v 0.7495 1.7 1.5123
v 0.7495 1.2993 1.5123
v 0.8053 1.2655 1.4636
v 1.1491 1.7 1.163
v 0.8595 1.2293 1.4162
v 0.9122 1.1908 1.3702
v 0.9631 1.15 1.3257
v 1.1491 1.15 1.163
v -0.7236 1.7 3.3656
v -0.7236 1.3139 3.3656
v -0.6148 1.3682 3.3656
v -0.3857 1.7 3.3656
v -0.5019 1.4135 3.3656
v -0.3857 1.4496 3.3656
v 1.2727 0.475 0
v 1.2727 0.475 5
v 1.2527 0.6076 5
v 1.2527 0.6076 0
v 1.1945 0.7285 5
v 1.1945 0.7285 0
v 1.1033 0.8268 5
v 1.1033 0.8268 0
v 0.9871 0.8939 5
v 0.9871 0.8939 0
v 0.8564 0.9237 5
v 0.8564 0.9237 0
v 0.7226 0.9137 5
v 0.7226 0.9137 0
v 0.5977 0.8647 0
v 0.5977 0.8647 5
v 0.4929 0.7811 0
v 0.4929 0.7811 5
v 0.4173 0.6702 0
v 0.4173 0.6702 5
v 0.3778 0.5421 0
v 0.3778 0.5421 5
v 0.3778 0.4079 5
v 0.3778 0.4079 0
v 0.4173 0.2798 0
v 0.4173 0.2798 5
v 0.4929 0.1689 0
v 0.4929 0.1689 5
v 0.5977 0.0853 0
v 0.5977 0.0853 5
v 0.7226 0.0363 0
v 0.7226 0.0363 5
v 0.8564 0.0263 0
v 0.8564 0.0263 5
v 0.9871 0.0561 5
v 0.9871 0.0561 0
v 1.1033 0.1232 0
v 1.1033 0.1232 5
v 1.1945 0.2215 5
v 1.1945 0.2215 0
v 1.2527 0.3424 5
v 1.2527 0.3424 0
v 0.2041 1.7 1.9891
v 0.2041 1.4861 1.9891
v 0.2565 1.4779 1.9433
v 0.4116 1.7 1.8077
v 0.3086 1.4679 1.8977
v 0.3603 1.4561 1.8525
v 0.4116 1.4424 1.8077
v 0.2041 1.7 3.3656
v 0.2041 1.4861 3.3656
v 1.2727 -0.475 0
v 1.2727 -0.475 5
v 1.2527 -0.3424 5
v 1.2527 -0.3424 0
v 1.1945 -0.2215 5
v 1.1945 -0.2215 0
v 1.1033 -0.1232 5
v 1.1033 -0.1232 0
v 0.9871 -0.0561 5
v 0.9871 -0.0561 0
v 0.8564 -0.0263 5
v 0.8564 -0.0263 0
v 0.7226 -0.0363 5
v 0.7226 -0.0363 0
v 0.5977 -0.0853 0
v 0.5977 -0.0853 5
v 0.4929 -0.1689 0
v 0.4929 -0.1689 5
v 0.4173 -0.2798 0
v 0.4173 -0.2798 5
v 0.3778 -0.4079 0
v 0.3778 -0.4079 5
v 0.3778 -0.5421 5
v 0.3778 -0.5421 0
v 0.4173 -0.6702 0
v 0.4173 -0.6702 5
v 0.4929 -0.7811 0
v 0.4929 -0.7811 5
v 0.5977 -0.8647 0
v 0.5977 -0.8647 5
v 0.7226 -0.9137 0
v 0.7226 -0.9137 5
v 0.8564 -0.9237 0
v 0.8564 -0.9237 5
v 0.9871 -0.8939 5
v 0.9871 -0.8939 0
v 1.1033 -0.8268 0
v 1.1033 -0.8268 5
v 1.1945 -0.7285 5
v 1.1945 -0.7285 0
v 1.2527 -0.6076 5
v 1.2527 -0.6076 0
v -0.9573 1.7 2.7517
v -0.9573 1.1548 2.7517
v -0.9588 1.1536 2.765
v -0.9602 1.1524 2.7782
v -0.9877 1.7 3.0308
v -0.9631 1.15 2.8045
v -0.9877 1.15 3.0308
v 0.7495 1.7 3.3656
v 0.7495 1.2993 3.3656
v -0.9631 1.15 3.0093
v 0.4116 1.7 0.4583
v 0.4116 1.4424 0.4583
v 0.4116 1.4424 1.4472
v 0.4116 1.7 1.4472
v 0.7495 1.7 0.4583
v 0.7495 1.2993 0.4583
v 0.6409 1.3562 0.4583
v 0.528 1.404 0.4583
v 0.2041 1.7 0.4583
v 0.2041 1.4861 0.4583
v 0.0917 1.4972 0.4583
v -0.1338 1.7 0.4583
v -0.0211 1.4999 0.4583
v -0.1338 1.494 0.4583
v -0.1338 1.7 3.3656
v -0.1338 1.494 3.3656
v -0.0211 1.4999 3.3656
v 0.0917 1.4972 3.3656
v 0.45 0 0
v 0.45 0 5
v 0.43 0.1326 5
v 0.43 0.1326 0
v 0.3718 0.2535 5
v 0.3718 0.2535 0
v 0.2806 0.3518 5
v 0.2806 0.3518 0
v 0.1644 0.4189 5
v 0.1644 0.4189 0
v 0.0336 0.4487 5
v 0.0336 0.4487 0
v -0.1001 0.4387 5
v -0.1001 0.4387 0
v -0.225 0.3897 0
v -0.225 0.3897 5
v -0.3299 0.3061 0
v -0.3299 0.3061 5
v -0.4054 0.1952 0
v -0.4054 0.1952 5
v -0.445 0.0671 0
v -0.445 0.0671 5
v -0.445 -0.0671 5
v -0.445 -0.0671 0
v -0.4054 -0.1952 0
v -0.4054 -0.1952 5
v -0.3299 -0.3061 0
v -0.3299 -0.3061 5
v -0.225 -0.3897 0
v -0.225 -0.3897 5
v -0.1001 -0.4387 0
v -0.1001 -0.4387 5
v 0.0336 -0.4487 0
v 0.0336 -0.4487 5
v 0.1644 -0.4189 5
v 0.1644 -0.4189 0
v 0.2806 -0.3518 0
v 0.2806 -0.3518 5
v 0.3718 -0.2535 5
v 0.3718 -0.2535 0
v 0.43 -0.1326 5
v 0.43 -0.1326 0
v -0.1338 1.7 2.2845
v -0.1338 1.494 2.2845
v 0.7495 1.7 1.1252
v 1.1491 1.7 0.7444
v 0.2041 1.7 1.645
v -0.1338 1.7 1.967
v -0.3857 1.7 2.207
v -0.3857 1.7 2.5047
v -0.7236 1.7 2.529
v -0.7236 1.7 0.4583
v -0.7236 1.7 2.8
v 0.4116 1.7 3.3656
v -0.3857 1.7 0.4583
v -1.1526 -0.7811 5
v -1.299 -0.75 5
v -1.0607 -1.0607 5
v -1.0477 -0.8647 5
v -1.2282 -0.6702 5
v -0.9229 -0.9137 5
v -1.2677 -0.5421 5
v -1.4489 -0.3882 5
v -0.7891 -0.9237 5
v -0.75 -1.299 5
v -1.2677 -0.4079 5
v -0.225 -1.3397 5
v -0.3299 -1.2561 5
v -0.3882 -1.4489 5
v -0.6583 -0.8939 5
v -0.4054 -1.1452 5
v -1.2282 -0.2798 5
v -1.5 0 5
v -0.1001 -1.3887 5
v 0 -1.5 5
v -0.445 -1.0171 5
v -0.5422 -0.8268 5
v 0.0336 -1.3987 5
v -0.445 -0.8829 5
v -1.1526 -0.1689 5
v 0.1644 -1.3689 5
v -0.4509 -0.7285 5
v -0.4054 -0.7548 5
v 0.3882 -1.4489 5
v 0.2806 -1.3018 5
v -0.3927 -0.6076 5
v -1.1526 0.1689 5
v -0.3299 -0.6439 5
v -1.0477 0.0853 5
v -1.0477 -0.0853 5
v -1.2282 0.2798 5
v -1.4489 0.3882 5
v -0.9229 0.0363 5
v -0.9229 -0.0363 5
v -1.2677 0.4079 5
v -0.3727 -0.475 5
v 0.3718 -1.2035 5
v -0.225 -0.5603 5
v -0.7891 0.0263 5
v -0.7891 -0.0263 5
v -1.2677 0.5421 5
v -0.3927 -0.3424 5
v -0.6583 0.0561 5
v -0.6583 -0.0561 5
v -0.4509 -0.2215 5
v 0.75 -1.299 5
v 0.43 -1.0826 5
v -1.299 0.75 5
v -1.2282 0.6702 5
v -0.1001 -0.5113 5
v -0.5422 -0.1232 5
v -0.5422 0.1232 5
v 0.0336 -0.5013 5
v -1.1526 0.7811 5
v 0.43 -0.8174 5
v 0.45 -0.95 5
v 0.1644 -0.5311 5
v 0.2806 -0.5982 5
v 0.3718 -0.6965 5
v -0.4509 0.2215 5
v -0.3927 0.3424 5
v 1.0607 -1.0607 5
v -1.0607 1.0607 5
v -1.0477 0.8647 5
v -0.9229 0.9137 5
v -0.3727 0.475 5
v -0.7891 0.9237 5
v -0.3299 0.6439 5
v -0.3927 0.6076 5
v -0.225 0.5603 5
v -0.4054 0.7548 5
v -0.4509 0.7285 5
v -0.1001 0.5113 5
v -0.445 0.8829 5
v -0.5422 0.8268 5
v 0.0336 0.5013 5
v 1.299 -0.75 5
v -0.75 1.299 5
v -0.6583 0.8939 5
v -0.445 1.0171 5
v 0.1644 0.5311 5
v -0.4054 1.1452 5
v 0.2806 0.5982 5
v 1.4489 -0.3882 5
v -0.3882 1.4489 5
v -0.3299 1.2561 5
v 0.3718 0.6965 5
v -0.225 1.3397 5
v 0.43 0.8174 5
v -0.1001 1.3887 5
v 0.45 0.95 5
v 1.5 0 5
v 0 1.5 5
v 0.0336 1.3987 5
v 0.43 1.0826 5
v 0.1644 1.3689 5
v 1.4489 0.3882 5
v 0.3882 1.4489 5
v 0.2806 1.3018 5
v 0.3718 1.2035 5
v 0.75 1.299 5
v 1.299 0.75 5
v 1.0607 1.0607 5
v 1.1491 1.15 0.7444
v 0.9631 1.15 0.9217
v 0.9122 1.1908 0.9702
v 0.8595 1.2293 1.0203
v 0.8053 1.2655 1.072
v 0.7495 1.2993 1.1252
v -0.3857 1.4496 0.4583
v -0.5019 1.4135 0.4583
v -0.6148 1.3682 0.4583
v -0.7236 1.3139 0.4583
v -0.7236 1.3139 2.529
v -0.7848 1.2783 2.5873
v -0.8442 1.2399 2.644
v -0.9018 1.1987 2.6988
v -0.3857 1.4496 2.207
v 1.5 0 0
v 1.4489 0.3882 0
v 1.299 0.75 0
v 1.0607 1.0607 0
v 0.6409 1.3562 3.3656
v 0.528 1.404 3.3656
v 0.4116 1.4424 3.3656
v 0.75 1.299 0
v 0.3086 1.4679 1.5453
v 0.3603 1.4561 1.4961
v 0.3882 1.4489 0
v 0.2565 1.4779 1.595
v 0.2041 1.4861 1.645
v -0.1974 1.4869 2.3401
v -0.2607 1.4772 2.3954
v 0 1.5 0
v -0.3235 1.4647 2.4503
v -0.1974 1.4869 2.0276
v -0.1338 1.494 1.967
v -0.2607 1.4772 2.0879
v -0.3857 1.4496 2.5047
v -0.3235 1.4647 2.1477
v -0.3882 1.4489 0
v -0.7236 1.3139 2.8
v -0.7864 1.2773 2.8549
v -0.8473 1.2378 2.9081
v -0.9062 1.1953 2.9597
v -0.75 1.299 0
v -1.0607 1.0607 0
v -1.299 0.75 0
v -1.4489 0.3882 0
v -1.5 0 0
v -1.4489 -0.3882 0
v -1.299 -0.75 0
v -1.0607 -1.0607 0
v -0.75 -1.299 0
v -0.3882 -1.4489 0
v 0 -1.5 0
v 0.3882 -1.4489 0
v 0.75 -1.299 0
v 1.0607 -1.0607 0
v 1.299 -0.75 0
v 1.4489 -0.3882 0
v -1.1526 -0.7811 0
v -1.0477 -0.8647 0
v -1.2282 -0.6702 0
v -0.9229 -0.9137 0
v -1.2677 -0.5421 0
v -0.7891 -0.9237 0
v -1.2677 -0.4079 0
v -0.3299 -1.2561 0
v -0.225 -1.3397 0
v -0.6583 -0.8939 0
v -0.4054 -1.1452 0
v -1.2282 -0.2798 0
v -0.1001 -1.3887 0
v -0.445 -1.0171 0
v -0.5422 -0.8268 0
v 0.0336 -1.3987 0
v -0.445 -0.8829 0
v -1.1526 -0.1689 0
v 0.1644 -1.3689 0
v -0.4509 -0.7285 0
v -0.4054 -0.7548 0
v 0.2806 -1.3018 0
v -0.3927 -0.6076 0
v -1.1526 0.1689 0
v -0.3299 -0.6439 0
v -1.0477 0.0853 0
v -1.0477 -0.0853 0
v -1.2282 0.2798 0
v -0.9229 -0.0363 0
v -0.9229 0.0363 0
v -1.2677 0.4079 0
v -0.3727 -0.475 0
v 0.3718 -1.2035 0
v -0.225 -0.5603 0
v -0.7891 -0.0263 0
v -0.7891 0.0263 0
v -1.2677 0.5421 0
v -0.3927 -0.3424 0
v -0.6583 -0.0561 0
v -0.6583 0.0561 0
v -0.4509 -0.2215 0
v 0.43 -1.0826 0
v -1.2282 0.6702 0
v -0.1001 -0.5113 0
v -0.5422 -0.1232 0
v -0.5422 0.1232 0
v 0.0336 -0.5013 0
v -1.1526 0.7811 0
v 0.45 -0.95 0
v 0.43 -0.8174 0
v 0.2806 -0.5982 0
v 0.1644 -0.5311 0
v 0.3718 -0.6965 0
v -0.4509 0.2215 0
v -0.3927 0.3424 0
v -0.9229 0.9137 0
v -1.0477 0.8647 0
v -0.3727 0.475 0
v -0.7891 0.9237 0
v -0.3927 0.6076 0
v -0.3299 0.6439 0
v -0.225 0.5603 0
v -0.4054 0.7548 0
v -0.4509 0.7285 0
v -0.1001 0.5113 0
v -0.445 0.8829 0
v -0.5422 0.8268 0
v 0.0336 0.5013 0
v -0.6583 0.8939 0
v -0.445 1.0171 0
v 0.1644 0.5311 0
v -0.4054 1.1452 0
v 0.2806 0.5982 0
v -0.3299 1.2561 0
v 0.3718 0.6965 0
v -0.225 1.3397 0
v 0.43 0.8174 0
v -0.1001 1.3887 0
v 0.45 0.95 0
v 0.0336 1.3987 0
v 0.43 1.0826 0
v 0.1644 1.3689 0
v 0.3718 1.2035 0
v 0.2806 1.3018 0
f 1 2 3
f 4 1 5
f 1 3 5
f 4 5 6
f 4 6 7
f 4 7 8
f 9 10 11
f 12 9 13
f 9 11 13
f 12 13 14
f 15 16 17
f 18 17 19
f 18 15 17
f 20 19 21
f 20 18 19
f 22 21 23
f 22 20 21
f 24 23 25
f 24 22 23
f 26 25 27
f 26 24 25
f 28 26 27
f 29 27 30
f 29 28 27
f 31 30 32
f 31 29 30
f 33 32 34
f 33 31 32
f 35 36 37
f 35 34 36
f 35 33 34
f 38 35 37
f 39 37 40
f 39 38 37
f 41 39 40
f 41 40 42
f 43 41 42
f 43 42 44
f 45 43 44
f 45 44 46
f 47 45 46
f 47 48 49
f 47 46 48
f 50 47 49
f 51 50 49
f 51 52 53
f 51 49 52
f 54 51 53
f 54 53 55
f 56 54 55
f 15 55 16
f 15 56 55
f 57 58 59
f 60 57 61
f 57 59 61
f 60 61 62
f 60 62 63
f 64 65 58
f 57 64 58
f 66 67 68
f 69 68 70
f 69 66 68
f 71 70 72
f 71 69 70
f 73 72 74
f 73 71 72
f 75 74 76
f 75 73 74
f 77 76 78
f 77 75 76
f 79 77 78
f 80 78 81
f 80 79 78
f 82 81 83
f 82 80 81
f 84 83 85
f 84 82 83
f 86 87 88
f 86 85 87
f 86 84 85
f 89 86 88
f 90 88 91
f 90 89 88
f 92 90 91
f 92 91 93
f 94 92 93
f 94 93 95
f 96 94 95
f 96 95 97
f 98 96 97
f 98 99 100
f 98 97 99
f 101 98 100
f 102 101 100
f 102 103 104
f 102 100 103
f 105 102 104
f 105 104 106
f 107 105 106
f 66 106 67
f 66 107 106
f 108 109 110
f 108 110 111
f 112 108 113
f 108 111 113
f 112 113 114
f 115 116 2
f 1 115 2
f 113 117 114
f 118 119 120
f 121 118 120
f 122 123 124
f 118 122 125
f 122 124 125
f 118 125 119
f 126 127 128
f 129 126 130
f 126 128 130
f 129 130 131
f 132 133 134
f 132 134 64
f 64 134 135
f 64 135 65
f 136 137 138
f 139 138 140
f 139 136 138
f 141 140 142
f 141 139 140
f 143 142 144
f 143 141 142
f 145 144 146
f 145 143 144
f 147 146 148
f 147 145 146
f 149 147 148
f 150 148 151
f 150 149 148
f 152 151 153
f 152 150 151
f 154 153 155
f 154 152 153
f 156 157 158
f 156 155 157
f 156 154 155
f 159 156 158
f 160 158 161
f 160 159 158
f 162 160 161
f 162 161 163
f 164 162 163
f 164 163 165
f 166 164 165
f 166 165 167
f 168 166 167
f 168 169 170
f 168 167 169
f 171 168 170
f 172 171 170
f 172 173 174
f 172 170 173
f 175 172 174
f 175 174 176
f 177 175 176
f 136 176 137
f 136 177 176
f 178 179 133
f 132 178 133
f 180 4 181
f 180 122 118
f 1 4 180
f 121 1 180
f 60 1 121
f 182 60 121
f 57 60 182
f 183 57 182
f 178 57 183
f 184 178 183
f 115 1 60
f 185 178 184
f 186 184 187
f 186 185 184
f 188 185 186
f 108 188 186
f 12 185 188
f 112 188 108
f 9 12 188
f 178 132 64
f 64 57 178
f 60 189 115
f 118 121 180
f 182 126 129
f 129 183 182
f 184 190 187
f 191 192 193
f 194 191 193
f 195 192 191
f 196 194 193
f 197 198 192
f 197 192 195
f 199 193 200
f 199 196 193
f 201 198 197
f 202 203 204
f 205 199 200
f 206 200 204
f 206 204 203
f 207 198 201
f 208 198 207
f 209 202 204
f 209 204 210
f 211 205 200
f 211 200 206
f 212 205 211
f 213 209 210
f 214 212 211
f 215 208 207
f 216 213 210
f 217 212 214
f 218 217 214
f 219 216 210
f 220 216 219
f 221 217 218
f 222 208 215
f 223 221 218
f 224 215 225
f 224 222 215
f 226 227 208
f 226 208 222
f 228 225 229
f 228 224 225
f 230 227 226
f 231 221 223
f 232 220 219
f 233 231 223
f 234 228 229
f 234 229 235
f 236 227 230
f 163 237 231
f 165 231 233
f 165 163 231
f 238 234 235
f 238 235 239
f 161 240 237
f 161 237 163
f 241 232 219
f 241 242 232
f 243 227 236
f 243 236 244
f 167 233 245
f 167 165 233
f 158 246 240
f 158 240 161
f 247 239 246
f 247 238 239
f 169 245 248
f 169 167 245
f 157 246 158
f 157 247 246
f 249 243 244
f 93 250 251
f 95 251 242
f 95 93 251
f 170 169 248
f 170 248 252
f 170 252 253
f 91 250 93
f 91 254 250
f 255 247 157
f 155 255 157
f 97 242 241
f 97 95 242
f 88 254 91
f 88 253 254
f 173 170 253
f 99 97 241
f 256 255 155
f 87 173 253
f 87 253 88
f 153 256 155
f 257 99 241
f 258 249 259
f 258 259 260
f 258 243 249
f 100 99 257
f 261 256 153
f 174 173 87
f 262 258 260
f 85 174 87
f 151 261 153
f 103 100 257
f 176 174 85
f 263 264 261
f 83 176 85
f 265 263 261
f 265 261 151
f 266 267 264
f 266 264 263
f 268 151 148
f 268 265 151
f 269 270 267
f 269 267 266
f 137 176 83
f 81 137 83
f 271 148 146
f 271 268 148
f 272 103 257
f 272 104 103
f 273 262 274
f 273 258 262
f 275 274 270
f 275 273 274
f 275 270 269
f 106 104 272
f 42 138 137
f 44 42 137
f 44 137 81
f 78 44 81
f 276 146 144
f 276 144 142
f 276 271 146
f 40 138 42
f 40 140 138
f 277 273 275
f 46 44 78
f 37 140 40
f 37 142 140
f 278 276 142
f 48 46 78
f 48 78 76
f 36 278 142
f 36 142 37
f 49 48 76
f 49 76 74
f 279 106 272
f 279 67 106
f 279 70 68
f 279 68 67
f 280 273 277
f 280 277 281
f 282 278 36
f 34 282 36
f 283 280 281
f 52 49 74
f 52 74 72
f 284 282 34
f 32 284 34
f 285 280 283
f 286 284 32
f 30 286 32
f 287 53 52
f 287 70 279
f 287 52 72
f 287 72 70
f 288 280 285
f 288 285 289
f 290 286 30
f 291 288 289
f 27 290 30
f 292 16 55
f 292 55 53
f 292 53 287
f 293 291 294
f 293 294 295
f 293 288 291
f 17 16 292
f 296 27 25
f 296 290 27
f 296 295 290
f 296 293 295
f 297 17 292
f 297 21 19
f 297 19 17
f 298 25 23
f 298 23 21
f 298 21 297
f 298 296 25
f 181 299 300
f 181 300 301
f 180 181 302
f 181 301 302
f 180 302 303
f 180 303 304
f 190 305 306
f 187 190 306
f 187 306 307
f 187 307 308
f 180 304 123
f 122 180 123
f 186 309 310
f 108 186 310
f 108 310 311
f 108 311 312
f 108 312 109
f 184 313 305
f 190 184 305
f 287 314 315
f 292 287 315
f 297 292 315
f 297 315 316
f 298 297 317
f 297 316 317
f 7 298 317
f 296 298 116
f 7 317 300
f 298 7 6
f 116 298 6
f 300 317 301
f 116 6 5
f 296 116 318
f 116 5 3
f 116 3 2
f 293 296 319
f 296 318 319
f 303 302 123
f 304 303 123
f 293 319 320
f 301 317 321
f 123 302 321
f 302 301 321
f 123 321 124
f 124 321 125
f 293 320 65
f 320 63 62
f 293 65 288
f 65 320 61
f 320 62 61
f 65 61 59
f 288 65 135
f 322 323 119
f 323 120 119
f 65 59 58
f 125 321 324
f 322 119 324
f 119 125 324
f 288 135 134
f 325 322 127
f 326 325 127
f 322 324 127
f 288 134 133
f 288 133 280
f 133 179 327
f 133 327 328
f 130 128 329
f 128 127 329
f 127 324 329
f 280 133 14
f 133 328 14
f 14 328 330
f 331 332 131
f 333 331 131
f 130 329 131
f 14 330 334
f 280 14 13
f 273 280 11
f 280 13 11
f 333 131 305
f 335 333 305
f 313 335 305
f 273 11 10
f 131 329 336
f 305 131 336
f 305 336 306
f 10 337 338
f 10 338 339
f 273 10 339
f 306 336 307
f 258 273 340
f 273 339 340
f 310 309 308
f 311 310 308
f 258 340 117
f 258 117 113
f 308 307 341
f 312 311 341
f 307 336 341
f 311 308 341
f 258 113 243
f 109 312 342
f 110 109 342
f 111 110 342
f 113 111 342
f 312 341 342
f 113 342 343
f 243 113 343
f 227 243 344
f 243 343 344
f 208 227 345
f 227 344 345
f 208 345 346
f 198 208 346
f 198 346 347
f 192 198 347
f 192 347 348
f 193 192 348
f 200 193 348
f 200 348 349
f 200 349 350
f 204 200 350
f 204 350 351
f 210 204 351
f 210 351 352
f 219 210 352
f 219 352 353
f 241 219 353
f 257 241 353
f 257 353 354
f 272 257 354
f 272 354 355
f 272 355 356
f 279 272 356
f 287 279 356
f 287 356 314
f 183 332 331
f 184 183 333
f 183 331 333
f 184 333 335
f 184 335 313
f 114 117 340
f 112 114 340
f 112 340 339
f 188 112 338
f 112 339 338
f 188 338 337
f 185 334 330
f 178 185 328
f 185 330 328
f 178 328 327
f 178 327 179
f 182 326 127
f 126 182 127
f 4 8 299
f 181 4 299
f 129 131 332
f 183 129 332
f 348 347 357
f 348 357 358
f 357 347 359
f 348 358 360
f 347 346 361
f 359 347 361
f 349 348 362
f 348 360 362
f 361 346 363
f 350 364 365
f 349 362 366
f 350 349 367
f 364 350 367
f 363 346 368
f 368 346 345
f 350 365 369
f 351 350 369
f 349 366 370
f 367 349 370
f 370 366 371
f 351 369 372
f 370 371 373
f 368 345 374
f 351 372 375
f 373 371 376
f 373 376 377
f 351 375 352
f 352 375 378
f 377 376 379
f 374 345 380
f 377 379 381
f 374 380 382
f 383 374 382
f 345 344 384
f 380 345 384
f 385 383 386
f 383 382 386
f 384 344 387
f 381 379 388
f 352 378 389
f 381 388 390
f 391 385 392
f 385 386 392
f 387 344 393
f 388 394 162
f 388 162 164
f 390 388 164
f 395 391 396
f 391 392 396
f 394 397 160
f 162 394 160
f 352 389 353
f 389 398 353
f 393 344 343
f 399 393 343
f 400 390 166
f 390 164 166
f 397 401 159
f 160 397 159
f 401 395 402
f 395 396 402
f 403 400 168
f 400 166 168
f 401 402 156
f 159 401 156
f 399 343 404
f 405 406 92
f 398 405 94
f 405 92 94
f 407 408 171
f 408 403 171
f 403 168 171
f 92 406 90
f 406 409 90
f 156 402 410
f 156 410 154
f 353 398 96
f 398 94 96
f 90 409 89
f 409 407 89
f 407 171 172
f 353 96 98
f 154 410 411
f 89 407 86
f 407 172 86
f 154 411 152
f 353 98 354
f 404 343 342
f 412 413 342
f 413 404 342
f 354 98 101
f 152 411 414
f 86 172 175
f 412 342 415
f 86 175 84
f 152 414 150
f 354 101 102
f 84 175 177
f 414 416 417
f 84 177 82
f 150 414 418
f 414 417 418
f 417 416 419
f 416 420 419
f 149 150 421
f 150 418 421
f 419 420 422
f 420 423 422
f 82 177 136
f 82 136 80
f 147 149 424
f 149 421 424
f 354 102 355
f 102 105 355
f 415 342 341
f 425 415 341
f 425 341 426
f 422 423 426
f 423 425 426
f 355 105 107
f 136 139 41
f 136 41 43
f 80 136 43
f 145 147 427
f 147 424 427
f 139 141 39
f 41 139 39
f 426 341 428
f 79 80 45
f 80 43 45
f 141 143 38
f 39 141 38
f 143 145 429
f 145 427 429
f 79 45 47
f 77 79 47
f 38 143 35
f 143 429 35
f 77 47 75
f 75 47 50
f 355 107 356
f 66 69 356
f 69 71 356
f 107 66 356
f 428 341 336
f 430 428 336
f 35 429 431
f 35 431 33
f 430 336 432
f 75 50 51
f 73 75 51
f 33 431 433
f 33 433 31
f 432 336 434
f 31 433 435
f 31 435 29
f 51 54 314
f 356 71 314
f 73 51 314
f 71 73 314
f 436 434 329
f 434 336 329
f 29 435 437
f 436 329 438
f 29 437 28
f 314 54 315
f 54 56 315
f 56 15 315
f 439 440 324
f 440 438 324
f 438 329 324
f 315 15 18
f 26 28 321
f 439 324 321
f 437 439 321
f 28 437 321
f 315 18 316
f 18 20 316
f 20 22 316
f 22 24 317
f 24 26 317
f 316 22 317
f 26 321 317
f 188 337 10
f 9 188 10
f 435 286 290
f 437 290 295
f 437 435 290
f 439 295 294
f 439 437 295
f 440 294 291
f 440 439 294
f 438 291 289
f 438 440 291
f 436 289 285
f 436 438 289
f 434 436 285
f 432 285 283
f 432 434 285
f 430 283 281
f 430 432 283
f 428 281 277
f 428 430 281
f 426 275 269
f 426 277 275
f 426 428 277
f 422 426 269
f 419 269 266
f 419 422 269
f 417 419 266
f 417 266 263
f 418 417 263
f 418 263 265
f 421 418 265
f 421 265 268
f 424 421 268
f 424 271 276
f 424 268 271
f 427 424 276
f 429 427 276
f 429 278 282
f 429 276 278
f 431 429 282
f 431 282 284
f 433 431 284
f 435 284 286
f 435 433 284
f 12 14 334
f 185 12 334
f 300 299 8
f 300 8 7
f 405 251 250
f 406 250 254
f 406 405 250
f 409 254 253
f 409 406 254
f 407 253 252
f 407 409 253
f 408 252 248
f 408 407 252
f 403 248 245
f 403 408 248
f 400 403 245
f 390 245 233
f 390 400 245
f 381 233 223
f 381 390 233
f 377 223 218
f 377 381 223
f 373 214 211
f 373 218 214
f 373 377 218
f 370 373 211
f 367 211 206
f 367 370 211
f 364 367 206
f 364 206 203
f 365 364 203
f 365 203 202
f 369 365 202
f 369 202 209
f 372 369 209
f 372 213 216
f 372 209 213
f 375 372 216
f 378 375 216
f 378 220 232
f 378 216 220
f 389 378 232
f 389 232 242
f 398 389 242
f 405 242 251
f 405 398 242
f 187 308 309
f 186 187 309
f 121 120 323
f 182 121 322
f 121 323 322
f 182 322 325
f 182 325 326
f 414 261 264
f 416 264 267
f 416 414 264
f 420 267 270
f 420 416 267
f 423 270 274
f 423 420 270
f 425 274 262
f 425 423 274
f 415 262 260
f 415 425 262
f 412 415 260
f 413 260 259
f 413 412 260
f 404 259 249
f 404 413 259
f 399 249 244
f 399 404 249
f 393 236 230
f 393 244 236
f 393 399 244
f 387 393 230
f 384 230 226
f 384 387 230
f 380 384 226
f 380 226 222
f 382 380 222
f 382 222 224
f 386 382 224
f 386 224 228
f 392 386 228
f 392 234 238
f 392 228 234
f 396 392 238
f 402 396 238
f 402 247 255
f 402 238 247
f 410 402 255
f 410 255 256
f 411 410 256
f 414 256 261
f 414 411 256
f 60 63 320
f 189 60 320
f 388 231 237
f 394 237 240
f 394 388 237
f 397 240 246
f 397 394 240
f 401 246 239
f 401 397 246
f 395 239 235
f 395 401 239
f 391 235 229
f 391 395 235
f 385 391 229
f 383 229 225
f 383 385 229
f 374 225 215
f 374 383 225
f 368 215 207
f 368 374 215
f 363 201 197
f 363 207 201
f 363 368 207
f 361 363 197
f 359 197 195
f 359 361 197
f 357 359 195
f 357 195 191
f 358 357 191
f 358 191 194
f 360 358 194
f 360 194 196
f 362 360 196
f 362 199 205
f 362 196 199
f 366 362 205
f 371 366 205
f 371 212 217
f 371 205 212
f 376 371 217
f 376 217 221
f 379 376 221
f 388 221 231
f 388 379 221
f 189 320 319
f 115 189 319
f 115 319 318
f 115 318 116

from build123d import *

# Parameters (mm, degrees)
F2_R      = 1.5
F3_DEPTH  = 5
F9_DEPTH  = 0.55
F1_R      = 0.45
F10_DEPTH = 5.001


with BuildPart() as f3:
    # F2 (on Top) → F3 (new body)
    with BuildSketch(Plane.XY):
        Circle(F2_R)
    extrude(amount=F3_DEPTH)

    # F8 (on face) → F9 (join)
    with BuildSketch(Plane(origin=(0, 1.15, 0), x_dir=(-1, 0, 0), z_dir=(0, 1, 0))):
        Polygon((0.9573300485, 2.7517464478), (0.9876711119, 3.0308461282), (0.7235942503, 2.8000105567), (0.7235942503, 2.5290050786), align=None)
        Polygon((0.7235942503, 2.5290050786), (0.7235942503, 2.8000105567), (0.3857031334, 2.5046522711), (0.3857031334, 2.2070076328), align=None)
        Polygon((0.3857031334, 2.5046522711), (0.7235942503, 2.8000105567), (0.7235942503, 3.3656487685), (0.3857031334, 3.3656487685), align=None)
        Polygon((0.7235942503, 0.4582579713), (0.7235942503, 2.5290050786), (0.3857031334, 2.2070076328), (0.3857031334, 0.4582579713), align=None)
        Polygon((0.3857031334, 2.2070076328), (0.3857031334, 2.5046522711), (0.1338190596, 2.2844746918), (0.1338190596, 1.966971644), align=None)
        Polygon((0.1338190596, 1.966971644), (0.1338190596, 2.2844746918), (-0.2040720574, 1.9891164063), (-0.2040720574, 1.6449741982), align=None)
        Polygon((-0.2040720574, 1.9891164063), (0.1338190596, 2.2844746918), (0.1338190596, 3.3656487685), (-0.2040720574, 3.3656487685), align=None)
        Polygon((0.1338190596, 0.4582579713), (0.1338190596, 1.966971644), (-0.2040720574, 1.6449741982), (-0.2040720574, 0.4582579713), align=None)
        Polygon((-0.2040720574, 1.6449741982), (-0.2040720574, 1.9891164063), (-0.4116180899, 1.8076957141), (-0.4116180899, 1.4471906846), align=None)
        Polygon((-0.4116180899, 1.4471906846), (-0.4116180899, 1.8076957141), (-0.7495092068, 1.5123374285), (-0.7495092068, 1.1251932388), align=None)
        Polygon((-0.7495092068, 1.5123374285), (-0.4116180899, 1.8076957141), (-0.4116180899, 3.3656487685), (-0.7495092068, 3.3656487685), align=None)
        Polygon((-0.4116180899, 0.4582579713), (-0.4116180899, 1.4471906846), (-0.7495092068, 1.1251932388), (-0.7495092068, 0.4582579713), align=None)
        Polygon((-0.7495092068, 1.1251932388), (-0.7495092068, 1.5123374285), (-1.1491243131, 1.1630248046), (-1.1491243131, 0.7443751674), align=None)
    extrude(amount=F9_DEPTH)

    # F1 (on Top) → F10 (cut, through all)
    with BuildSketch(Plane.XY):
        Circle(F1_R)
        with Locations((0, 0.95)):
            Circle(F1_R)
        with Locations((0.8227241336, 0.475)):
            Circle(F1_R)
        with Locations((0.8227241336, -0.475)):
            Circle(F1_R)
        with Locations((0, -0.95)):
            Circle(F1_R)
        with Locations((-0.8227241336, -0.475)):
            Circle(F1_R)
        with Locations((-0.8227241336, 0.475)):
            Circle(F1_R)
    extrude(amount=F10_DEPTH, mode=Mode.SUBTRACT)


solid = f3.part
